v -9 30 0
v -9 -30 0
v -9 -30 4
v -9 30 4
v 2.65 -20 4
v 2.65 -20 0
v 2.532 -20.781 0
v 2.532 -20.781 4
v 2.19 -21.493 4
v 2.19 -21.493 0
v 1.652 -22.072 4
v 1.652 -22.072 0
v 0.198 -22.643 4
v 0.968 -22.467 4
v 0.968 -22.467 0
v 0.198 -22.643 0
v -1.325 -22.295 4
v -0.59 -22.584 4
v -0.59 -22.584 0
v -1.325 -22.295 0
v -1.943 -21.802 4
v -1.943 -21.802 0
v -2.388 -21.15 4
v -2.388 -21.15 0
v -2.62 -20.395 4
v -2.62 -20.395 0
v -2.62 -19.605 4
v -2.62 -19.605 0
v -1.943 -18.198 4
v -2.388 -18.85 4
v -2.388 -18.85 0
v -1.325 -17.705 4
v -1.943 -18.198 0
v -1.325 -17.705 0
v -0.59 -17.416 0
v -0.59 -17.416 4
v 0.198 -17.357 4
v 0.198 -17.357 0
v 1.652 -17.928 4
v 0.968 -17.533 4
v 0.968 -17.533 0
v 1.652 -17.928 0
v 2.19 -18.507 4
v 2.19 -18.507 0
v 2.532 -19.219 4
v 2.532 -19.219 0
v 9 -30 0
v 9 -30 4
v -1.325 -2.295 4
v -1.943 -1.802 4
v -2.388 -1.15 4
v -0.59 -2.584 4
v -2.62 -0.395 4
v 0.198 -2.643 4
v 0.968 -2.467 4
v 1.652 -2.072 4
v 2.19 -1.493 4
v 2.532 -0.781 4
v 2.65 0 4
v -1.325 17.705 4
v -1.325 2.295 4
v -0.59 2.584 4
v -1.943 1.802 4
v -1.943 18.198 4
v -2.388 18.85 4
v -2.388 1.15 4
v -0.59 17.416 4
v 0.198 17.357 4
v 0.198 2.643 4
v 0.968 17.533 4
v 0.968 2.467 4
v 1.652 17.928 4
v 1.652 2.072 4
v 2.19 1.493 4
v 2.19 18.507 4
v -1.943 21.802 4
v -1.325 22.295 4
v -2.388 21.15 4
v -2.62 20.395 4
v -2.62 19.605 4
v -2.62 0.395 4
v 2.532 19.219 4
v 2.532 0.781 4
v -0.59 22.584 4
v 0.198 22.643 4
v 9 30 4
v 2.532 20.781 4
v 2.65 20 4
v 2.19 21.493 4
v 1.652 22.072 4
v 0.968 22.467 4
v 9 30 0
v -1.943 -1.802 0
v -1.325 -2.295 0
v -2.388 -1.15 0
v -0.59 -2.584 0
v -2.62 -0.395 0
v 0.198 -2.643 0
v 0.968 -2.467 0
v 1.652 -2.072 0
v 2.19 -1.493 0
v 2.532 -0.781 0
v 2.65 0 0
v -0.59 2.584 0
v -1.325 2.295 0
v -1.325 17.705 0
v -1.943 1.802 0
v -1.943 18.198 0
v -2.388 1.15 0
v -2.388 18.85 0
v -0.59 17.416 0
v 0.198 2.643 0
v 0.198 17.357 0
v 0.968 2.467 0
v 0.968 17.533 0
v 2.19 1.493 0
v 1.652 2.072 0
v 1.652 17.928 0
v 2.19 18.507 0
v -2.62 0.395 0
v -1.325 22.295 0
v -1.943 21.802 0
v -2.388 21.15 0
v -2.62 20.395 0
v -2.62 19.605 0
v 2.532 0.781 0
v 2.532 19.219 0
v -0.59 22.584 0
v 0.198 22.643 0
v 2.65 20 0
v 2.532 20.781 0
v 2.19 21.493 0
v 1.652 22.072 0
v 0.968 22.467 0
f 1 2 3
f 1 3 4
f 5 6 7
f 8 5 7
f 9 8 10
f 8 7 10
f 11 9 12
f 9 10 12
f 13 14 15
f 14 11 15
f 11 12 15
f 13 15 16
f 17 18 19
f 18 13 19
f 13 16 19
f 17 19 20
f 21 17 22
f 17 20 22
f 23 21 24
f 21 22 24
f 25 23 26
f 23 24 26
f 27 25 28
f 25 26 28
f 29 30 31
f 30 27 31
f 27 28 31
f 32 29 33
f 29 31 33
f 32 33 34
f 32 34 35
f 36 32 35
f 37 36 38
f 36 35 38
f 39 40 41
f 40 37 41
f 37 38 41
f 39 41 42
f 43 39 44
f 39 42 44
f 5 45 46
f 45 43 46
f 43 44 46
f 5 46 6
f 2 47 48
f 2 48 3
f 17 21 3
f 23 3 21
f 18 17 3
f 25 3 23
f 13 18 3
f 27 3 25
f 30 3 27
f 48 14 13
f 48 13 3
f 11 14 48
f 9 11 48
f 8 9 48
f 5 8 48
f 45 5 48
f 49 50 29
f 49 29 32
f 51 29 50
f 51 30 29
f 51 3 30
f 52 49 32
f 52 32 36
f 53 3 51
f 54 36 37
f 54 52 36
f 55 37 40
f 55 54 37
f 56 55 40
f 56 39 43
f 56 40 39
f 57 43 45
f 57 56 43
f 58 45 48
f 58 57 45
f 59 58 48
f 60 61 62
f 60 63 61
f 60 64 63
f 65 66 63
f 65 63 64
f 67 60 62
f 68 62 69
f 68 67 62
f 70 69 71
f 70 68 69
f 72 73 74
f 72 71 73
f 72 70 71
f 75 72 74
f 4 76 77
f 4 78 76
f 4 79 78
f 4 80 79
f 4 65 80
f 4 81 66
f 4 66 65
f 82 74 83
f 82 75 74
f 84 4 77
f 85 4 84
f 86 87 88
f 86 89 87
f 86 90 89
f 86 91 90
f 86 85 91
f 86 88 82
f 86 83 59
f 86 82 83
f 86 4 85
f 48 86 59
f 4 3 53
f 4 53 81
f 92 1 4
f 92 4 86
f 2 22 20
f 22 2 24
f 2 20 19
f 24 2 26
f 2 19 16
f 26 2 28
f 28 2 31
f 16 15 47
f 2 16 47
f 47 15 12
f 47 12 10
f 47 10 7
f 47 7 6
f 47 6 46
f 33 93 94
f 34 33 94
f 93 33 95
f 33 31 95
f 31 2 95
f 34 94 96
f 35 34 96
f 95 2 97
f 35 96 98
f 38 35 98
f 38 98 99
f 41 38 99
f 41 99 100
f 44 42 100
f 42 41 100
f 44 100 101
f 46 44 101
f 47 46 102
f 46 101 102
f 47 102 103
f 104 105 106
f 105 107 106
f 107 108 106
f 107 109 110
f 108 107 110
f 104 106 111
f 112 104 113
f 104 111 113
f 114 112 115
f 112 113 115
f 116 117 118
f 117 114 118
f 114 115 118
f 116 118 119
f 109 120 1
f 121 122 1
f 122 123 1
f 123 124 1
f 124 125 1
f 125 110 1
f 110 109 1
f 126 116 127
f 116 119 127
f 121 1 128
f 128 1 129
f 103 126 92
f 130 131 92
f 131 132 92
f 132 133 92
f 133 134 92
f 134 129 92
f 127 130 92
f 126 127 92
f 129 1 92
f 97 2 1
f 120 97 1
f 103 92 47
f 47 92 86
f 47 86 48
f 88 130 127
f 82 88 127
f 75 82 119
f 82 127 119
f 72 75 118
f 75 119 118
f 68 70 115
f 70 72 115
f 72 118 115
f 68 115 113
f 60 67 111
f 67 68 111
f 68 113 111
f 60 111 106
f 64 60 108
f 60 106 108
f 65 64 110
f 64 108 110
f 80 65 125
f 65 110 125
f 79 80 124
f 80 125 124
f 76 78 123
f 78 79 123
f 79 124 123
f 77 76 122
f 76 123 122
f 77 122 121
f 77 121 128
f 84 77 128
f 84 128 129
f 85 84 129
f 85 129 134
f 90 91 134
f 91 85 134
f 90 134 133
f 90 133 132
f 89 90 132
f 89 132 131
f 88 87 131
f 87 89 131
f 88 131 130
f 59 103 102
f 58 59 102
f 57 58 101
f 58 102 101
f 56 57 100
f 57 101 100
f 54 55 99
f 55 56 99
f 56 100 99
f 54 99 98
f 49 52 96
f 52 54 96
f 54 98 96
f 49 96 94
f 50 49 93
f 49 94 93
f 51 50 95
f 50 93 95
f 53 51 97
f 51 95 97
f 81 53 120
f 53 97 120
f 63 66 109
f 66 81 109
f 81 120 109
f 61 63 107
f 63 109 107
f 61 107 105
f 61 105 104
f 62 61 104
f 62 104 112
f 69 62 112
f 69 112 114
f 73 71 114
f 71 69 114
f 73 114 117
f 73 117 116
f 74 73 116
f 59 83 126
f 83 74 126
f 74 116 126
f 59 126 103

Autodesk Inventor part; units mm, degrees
ref_plane "YZ Plane" through (0, 0, 0) normal (1, 0, 0) x (0, 1, 0)
ref_plane "XZ Plane" through (0, 0, 0) normal (0, 1, 0) x (-1, 0, 0)
ref_plane "XY Plane" through (0, 0, 0) normal (0, 0, 1) x (1, 0, 0)
sketch "Sketch1" plane through (0, 0, 0) normal (0, 0, 1) x (1, 0, 0)
  line L0 (-9, 30) -> (9, 30)
  line L1 (9, 30) -> (9, -30)
  line L2 (9, -30) -> (-9, -30)
  line L3 (-9, -30) -> (-9, 30)
  line L4 (-9, 30) -> (9, -30) construction
  line L5 (9, 30) -> (-9, -30) construction
  circle A0 centre (0, 0) radius 2.65
  circle A1 centre (0, 20) radius 2.65
  circle A2 centre (0, -20) radius 2.65
  dimension "d0" = 18
  dimension "d2" = 60
  dimension "d3" = 5.3
  dimension "d4" = 5.3
  dimension "d5" = 20
  dimension "d6" = 9
  dimension "d7" = 5.3
  dimension "d8" = 20
  dimension "d9" = 9
extrude "Extrusion1" add sketch "Sketch1" along normal blind 4
equation "\"d4\" = d3"
equation "\"d7\" = d3"
equation "\"d8\" = d5"
properties part number "3 Hole Joining Strip Plate" material "Aluminum 6061"
